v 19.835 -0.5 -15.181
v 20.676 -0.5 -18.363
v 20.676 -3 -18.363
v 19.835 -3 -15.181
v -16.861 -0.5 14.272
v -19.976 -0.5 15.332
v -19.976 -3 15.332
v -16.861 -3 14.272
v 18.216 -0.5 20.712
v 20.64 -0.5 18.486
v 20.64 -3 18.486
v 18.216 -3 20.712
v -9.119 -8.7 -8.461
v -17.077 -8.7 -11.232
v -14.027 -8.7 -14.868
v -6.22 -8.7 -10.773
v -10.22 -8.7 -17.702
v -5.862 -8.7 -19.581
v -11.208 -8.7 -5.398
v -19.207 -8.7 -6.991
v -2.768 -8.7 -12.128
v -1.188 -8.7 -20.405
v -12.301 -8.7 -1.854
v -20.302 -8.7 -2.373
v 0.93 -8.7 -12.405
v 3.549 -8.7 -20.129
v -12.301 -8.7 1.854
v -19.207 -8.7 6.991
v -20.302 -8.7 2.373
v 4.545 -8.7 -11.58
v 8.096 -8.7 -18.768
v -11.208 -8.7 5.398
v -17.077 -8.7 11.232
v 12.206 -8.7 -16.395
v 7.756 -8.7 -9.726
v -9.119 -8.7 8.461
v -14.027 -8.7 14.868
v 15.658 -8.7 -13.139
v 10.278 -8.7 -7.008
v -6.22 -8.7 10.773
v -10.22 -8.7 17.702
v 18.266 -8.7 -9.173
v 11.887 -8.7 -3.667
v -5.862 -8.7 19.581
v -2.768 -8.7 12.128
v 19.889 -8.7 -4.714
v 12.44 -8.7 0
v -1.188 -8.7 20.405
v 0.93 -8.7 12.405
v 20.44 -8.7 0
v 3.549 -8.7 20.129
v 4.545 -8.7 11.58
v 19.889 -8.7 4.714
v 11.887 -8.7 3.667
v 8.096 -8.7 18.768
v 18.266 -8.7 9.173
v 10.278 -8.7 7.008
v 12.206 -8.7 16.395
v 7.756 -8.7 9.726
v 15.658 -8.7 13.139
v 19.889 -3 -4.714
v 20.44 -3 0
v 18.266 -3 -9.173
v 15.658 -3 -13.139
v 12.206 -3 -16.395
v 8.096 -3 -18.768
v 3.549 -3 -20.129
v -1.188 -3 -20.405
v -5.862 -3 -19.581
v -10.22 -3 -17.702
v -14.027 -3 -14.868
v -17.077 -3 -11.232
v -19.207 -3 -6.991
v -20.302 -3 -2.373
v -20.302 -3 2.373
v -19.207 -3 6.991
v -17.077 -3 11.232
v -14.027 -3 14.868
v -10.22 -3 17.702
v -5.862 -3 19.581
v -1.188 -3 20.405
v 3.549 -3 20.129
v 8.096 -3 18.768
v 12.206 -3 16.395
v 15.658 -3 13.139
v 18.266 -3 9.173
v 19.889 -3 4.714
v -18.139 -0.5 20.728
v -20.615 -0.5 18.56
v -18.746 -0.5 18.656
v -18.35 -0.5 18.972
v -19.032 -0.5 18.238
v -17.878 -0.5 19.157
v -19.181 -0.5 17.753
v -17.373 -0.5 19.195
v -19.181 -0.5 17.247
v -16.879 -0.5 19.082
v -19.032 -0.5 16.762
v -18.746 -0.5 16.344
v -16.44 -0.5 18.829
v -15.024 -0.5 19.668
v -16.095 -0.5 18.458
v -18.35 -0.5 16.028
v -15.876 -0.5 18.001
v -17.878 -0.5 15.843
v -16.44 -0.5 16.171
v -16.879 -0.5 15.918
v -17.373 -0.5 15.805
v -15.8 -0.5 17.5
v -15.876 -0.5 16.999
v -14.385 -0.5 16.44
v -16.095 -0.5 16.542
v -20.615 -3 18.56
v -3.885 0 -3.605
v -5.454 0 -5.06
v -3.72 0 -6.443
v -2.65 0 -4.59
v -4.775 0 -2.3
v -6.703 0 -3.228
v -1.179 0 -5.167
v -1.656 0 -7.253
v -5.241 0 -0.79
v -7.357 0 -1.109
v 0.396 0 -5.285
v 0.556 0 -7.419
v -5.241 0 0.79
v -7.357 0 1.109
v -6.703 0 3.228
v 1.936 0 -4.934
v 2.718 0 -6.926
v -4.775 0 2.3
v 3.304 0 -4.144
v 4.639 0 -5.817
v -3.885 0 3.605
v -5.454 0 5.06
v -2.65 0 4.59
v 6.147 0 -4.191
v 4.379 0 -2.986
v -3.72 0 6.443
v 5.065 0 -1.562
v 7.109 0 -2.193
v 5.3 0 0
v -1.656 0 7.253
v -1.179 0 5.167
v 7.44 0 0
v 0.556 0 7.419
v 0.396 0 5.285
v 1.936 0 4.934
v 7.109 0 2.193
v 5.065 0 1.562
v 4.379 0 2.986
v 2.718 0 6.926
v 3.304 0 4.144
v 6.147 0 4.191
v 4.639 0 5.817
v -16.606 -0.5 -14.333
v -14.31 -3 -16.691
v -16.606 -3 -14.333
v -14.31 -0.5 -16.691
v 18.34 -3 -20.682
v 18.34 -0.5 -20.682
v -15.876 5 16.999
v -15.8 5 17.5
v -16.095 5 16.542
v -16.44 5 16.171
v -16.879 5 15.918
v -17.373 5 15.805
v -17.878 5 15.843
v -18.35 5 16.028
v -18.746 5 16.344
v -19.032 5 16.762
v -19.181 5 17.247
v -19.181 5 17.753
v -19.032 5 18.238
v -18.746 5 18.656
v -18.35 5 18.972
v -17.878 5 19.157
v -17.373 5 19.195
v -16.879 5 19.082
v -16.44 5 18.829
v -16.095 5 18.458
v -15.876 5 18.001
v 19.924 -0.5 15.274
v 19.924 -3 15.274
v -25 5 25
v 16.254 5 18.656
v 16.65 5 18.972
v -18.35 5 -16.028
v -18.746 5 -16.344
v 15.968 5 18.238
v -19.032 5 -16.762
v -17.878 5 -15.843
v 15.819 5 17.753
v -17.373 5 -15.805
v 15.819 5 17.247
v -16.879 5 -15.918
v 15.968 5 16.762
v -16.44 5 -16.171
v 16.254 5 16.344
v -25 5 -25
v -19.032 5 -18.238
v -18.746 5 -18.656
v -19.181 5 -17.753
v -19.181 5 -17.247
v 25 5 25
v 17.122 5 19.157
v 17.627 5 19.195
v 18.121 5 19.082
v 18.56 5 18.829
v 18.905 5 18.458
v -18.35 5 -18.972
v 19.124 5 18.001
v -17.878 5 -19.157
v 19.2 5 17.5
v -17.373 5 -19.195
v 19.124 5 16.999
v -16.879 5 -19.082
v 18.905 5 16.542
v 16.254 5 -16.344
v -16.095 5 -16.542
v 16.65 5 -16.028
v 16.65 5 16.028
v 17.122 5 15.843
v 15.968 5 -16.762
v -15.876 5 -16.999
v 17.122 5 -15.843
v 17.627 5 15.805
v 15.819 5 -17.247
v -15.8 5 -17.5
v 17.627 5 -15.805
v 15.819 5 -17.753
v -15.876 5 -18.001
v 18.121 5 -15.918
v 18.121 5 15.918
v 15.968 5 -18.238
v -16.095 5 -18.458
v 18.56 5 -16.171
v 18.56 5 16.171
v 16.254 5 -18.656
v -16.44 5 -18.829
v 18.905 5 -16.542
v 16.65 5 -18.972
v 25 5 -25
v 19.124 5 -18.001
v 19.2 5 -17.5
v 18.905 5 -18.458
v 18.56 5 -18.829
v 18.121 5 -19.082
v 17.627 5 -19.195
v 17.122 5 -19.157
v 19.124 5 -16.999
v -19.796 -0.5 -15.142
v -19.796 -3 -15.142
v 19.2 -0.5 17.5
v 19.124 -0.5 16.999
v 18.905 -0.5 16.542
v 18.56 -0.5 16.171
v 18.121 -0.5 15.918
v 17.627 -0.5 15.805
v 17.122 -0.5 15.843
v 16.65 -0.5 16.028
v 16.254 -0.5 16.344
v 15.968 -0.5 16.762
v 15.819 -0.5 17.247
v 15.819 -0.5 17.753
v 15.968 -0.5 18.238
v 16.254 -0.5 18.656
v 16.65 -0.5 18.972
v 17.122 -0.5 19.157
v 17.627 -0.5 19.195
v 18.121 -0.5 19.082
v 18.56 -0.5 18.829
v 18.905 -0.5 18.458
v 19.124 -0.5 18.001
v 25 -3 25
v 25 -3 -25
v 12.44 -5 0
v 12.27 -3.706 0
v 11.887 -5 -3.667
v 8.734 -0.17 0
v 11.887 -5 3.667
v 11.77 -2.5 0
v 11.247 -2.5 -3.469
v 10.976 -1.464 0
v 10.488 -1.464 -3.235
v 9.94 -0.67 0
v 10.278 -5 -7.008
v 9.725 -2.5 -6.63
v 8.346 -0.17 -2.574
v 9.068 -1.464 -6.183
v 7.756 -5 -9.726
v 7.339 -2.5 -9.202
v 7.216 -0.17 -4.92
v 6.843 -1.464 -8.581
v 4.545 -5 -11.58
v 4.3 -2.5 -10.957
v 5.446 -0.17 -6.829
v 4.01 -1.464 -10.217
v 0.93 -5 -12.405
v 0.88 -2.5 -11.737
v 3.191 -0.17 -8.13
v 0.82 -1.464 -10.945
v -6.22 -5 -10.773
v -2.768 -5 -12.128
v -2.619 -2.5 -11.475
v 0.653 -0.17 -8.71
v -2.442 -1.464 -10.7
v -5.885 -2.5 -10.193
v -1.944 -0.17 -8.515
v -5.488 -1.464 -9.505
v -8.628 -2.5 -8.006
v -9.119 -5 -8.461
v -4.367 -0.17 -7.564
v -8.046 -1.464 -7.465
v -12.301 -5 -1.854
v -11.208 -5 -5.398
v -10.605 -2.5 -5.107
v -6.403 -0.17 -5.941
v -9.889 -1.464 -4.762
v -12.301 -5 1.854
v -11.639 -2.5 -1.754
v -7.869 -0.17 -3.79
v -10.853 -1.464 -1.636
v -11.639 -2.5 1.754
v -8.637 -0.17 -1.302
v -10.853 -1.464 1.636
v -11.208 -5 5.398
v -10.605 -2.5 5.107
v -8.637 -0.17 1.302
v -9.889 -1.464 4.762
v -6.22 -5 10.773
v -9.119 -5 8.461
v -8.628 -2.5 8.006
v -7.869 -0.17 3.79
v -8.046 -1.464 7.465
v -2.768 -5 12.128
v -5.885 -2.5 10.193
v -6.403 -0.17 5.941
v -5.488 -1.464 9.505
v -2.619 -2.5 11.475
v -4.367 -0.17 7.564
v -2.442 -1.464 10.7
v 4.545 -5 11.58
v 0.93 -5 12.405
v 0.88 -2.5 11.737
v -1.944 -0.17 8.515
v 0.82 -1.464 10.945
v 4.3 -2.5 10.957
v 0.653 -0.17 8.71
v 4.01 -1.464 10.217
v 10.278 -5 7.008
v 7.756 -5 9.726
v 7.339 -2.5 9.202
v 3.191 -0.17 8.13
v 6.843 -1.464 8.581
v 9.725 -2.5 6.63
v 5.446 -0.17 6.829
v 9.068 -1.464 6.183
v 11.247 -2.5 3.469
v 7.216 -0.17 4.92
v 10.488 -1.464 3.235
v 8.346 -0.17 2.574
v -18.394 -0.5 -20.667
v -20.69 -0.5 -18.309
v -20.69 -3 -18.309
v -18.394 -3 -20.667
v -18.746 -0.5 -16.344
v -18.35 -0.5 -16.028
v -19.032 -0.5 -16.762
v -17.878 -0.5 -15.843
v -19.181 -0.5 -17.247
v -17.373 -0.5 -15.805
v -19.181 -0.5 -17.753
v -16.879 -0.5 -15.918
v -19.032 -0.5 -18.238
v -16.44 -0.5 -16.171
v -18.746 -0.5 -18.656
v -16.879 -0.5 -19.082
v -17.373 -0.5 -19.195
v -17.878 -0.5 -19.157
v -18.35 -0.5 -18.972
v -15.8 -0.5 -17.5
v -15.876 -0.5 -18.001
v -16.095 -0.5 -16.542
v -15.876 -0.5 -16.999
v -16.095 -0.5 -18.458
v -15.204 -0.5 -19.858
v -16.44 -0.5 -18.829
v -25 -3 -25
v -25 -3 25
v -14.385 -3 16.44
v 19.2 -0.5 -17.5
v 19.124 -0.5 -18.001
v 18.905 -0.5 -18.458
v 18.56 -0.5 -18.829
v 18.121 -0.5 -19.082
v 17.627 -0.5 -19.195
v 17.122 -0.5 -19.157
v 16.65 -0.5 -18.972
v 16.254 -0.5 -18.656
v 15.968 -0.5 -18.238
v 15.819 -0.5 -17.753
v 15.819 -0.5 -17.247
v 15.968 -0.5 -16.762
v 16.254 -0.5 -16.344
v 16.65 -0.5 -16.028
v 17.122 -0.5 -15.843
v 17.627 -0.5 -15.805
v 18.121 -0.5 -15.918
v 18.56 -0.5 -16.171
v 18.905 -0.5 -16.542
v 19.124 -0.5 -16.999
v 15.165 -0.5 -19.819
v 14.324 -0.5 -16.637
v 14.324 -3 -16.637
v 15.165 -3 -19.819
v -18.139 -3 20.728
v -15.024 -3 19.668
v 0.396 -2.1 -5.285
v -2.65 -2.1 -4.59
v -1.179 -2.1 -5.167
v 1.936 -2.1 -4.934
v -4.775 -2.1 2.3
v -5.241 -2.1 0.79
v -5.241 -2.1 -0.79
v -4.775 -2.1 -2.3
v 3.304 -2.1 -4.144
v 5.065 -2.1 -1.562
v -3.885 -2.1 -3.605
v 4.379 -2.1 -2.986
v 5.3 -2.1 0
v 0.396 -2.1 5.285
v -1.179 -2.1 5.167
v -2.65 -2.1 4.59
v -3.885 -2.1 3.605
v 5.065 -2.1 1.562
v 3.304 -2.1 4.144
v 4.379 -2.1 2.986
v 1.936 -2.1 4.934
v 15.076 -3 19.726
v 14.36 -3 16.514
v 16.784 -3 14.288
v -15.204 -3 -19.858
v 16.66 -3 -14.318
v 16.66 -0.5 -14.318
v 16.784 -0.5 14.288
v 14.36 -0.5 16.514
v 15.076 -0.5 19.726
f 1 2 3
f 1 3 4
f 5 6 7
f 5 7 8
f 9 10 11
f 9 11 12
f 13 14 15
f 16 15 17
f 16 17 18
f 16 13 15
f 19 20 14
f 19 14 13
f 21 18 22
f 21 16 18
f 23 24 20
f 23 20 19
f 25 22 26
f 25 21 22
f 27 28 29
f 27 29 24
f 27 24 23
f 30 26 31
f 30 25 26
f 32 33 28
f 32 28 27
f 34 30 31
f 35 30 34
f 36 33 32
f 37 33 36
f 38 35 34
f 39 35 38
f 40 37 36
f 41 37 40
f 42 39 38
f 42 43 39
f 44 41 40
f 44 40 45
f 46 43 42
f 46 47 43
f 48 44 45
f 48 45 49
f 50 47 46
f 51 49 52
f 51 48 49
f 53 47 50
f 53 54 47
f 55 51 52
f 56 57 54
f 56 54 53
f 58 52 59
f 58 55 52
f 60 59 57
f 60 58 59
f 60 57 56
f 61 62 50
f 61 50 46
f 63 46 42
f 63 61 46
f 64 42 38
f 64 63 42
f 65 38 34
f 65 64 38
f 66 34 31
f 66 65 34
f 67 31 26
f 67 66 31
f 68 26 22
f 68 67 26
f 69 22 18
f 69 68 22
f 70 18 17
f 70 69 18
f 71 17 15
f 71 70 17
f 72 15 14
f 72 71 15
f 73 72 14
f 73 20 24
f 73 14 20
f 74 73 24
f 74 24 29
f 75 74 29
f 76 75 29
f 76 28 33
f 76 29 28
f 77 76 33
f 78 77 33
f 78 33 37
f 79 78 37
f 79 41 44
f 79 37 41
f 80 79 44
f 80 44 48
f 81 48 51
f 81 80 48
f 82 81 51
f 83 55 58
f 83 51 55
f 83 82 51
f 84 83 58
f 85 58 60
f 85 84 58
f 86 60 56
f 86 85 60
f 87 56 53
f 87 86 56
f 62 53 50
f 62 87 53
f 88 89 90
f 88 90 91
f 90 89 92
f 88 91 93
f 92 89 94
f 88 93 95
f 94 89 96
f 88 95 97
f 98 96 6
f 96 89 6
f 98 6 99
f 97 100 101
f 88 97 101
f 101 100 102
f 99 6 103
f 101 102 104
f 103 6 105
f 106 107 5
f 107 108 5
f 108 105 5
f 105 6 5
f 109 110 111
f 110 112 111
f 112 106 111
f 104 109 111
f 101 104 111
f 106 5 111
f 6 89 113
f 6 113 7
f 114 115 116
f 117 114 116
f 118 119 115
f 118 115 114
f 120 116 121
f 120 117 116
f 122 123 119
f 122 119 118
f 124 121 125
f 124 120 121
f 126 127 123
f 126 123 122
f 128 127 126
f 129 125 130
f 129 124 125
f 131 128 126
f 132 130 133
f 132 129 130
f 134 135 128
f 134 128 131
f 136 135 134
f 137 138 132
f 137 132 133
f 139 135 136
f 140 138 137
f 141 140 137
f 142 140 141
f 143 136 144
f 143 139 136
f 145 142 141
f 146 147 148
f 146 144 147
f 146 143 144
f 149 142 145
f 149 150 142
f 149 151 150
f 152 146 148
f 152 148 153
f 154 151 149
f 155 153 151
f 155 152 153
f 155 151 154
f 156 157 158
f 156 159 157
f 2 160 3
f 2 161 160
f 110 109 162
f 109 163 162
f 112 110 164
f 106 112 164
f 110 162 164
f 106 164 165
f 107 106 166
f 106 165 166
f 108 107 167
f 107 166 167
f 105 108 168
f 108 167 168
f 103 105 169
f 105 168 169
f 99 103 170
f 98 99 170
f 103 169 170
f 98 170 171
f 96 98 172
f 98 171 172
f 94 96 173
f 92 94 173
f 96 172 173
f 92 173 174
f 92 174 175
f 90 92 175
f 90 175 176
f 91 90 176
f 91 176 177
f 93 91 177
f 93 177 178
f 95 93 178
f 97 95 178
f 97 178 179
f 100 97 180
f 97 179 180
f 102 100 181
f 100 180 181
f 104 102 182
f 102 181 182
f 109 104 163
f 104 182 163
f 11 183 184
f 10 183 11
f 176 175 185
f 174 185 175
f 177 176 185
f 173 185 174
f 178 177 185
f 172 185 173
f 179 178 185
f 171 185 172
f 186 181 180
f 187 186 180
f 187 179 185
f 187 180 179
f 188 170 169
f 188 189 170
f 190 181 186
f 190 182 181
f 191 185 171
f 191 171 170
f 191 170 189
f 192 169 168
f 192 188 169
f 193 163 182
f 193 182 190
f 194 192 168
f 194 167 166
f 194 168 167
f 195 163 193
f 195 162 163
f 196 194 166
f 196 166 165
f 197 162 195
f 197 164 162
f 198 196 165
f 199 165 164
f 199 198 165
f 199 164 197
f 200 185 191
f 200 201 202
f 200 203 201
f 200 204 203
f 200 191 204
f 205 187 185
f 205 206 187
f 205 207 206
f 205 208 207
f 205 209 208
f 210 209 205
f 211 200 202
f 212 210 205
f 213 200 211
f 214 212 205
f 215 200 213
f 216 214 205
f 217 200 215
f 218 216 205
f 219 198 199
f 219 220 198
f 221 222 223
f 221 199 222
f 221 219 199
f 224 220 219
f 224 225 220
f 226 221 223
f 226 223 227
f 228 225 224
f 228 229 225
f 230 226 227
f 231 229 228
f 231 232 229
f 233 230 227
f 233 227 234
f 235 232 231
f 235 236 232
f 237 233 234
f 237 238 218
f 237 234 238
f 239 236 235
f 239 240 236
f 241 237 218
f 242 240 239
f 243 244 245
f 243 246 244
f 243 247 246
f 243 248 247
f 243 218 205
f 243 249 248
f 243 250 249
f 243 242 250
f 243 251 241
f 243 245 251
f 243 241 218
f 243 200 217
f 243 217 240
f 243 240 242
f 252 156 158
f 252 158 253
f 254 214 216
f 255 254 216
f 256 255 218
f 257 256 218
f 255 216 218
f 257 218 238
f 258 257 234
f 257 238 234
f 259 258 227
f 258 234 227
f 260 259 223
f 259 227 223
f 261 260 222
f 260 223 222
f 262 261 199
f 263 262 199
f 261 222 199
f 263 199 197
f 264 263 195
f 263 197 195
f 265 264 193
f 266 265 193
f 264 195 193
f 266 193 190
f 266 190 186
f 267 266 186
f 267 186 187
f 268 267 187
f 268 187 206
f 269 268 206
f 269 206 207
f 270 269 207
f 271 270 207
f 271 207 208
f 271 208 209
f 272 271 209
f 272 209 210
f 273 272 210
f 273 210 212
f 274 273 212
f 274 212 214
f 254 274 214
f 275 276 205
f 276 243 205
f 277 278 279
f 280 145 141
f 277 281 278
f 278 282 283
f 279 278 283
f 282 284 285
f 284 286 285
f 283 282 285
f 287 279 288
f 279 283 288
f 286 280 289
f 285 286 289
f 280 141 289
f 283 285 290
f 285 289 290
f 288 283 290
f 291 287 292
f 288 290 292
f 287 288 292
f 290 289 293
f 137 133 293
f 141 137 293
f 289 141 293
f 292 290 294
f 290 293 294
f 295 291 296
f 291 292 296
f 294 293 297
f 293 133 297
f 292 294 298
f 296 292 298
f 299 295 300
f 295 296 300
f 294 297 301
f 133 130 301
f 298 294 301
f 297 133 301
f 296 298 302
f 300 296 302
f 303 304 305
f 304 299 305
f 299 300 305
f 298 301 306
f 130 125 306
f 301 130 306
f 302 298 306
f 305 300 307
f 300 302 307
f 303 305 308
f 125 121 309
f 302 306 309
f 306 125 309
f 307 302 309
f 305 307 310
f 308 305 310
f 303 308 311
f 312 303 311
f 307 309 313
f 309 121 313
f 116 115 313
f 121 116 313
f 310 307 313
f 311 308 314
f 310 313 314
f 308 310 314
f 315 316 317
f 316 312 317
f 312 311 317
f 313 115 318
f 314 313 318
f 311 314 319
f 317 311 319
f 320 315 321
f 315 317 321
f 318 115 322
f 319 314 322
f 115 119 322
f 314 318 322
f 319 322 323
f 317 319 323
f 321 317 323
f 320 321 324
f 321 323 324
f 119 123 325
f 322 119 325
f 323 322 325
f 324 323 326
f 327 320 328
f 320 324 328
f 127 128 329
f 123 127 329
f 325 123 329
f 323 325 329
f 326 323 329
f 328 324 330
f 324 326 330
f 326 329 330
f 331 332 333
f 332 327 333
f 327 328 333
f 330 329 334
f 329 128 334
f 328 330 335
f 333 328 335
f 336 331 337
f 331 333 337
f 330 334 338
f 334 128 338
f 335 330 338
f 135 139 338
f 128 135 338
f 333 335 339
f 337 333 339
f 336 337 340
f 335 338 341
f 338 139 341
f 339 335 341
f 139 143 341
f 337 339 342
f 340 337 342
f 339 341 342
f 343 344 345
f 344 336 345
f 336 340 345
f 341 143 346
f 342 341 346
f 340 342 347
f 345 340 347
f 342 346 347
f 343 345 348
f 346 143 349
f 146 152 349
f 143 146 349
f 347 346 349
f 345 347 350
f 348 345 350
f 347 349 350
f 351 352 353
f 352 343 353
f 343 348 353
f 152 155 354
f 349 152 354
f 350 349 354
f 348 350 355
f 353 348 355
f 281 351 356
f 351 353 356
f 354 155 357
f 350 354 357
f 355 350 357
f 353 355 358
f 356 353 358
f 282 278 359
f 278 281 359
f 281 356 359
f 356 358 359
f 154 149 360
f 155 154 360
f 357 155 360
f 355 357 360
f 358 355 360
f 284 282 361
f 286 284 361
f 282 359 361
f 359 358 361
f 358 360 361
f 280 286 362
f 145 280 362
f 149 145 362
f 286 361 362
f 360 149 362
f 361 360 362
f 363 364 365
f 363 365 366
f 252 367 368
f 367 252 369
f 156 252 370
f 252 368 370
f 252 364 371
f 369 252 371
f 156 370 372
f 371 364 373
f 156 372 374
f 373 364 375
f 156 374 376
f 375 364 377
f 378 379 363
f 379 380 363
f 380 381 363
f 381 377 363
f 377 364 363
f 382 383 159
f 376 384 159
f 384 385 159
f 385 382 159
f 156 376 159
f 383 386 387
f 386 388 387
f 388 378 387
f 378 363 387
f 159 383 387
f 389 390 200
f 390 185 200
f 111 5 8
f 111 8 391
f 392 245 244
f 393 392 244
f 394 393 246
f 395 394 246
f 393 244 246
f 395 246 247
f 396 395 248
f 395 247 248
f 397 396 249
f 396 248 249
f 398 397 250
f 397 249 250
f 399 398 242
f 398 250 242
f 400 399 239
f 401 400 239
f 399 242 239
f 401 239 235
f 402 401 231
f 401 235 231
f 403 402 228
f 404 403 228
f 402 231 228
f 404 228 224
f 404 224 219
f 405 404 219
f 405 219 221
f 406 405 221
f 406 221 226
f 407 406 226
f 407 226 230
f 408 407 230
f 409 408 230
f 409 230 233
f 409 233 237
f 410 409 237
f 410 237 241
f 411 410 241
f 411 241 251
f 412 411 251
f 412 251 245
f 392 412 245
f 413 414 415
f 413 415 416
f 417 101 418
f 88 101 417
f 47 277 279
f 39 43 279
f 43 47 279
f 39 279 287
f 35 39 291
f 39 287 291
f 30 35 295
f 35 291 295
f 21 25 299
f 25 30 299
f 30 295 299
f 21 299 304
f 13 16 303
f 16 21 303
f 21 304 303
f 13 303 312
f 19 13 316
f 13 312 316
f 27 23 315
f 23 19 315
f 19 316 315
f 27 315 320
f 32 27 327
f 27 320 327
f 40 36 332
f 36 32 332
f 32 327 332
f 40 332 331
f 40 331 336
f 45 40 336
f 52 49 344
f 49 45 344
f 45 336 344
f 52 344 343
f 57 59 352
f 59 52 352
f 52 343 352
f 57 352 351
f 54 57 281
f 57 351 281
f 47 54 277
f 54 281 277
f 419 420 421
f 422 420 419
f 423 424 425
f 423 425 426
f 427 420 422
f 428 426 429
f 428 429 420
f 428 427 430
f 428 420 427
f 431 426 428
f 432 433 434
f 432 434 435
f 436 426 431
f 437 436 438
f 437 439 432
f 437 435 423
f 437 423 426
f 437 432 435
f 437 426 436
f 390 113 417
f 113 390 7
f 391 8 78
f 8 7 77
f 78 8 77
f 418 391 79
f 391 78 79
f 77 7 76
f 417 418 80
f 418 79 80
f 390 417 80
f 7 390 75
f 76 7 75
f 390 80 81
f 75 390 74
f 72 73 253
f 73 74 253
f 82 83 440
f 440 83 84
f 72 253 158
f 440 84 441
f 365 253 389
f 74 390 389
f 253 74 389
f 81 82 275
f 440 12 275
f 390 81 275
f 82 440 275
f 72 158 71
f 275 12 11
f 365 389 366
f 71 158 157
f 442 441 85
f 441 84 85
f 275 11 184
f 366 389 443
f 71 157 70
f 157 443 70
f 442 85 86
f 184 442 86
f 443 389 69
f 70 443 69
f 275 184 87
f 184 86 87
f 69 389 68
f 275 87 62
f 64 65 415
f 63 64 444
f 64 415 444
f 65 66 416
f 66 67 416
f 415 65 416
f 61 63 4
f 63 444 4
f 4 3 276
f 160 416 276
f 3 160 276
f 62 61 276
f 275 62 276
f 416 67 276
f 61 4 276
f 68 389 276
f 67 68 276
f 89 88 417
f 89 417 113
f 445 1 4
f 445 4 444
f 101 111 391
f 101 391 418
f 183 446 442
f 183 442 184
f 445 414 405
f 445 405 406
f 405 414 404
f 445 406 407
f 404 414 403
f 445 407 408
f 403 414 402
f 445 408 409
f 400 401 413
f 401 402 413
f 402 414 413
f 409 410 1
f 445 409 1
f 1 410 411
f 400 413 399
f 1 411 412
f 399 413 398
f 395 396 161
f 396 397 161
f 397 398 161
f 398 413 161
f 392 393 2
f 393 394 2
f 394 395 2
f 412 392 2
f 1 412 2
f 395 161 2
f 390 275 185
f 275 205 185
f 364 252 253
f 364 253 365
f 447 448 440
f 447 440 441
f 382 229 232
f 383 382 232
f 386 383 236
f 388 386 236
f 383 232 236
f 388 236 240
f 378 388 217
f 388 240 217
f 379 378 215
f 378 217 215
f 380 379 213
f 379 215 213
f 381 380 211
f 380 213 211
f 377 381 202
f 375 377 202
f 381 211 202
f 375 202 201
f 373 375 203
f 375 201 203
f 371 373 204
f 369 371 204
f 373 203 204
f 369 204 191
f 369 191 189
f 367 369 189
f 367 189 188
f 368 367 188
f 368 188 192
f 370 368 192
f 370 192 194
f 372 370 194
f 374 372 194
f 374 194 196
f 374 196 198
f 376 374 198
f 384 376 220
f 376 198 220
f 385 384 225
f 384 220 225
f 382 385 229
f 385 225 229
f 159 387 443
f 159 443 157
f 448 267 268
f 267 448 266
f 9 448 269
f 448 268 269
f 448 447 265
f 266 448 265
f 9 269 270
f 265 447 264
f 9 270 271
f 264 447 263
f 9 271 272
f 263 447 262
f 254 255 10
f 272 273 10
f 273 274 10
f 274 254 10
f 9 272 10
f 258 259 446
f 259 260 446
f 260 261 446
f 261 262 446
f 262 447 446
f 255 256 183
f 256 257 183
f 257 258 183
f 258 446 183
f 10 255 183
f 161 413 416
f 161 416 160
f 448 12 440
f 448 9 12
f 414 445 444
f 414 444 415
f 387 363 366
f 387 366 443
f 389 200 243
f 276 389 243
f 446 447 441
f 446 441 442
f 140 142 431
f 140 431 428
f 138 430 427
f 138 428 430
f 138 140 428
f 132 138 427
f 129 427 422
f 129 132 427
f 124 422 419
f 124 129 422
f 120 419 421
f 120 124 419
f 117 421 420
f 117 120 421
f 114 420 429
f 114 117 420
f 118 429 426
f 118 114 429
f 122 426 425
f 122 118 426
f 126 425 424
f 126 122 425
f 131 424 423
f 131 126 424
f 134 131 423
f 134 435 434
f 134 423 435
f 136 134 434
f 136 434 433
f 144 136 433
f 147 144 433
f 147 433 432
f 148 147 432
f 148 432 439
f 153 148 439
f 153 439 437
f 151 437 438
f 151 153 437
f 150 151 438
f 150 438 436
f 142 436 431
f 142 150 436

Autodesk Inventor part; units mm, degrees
ref_plane "YZ Plane" through (0, 0, 0) normal (1, 0, 0) x (0, 1, 0)
ref_plane "XZ Plane" through (0, 0, 0) normal (0, 1, 0) x (-1, 0, 0)
ref_plane "XY Plane" through (0, 0, 0) normal (0, 0, 1) x (1, 0, 0)
sketch "Sketch1" plane through (0, 0, 0) normal (0, 0, 1) x (1, 0, 0)
  line L0 (0, -8.6) -> (12.34, -8.6) construction
  line L1 (0, 0) -> (0, -8.6)
  line L2 (0, 0) -> (0, -2.1)
  line L3 (0, -2.1) -> (5.3, -2.1)
  line L4 (5.3, -2.1) -> (5.3, 0)
  line L5 (5.3, 0) -> (7.44, 0)
  line L6 (12.44, -8.7) -> (12.44, -5)
  arc A0 (12.44, -5) -> (7.44, 0) centre (7.44, -5) ccw
  line L7 (12.44, -8.7) -> (20.44, -8.7)
  line L8 (20.44, -8.7) -> (20.44, 5)
  line L9 (20.44, 5) -> (0, 5)
  line L10 (0, 5) -> (0, -2.1)
  line L11 (-4.088, 0) -> (24.528, 0) projected
  dimension "d2" = 12.34
  dimension "d3" = 8.6
  dimension "d7" = 0
  dimension "d11" = 5.3
  dimension "d12" = 2.1
  dimension "d14" = 5
  dimension "d15" = 8
  dimension "d16" = 13.7
  dimension "d17" = 3.7
  dimension "d18" = 5
revolve "Revolution2" add sketch "Sketch1" angle 360 about axis through (0, 5, 0) along (0, -1, 0)
sketch "Sketch2" plane through (0, 5, 0) normal (0, 1, 0) x (1, 0, 0)
  line L0 (-25, 25) -> (25, 25)
  line L1 (25, 25) -> (25, -25)
  line L2 (25, -25) -> (-25, -25)
  line L3 (-25, -25) -> (-25, 25)
  line L4 (-17.5, 17.5) -> (17.5, 17.5) construction
  line L5 (17.5, 17.5) -> (17.5, -17.5) construction
  line L6 (17.5, -17.5) -> (-17.5, -17.5) construction
  line L7 (-17.5, -17.5) -> (-17.5, 17.5) construction
  circle A0 centre (-17.5, 17.5) radius 1.7
  circle A1 centre (17.5, 17.5) radius 1.7
  circle A2 centre (-17.5, -17.5) radius 1.7
  circle A3 centre (17.5, -17.5) radius 1.7
  line L8 (18.3404, 20.6818) -> (20.6757, 18.3631)
  line L9 (20.6757, 18.3631) -> (19.8353, 15.1813)
  line L10 (19.8353, 15.1813) -> (16.6596, 14.3182)
  line L11 (16.6596, 14.3182) -> (14.3243, 16.6369)
  line L12 (14.3243, 16.6369) -> (15.1647, 19.8187)
  line L13 (15.1647, 19.8187) -> (18.3404, 20.6818)
  line L14 (-16.6058, 14.3329) -> (-19.7956, 15.142)
  line L15 (-19.7956, 15.142) -> (-20.6899, 18.3091)
  line L16 (-20.6899, 18.3091) -> (-18.3942, 20.6671)
  line L17 (-18.3942, 20.6671) -> (-15.2044, 19.858)
  line L18 (-15.2044, 19.858) -> (-14.3101, 16.6909)
  line L19 (-14.3101, 16.6909) -> (-16.6058, 14.3329)
  line L20 (-15.0239, -19.6677) -> (-18.1393, -20.7282)
  line L21 (-18.1393, -20.7282) -> (-20.6153, -18.5605)
  line L22 (-20.6153, -18.5605) -> (-19.9761, -15.3323)
  line L23 (-19.9761, -15.3323) -> (-16.8607, -14.2718)
  line L24 (-16.8607, -14.2718) -> (-14.3847, -16.4395)
  line L25 (-14.3847, -16.4395) -> (-15.0239, -19.6677)
  line L26 (19.9241, -15.2743) -> (20.6396, -18.4864)
  line L27 (20.6396, -18.4864) -> (18.2155, -20.7122)
  line L28 (18.2155, -20.7122) -> (15.0759, -19.7257)
  line L29 (15.0759, -19.7257) -> (14.3604, -16.5136)
  line L30 (14.3604, -16.5136) -> (16.7845, -14.2878)
  line L31 (16.7845, -14.2878) -> (19.9241, -15.2743)
  circle A4 centre (0, 0) radius 12.44 projected
  circle A5 centre (0, 0) radius 12.44 projected
  point P0 (17.5, 17.5)
  dimension "d25" = 35
  dimension "d27" = 17.5
  dimension "d28" = 17.5
  dimension "d29" = 35
  dimension "d30" = 3.4
  dimension "d31" = 3.4
  dimension "d32" = 3.4
  dimension "d33" = 3.4
  dimension "d34" = 5.7
  dimension "d36" = 5.7
  dimension "d37" = 5.7
  dimension "d38" = 5.7
  dimension "d39" = 50
  dimension "d40" = 50
  dimension "d41" = 25
  dimension "d42" = 25
extrude "Extrusion1" add sketch "Sketch2" against normal blind 8 contours L0 L1 L2 L3
extrude "Extrusion2" add sketch "Sketch2" against normal blind 5.5 contours L8 L9 L10 L11 L12 L13 | L14 L15 L16 L17 L18 L19 | L20 L21 L22 L23 L24 L25 | L26 L27 L28 L29 L30 L31
equation "\"d27\" = 0.5 * d29"
equation "\"d28\" = d27"
equation "\"d36\" = d34"
equation "\"d37\" = d34"
equation "\"d38\" = d34"
equation "\"d41\" = 0.5 * d39"
equation "\"d42\" = d41"
properties part number "BallBearingCupMount"
